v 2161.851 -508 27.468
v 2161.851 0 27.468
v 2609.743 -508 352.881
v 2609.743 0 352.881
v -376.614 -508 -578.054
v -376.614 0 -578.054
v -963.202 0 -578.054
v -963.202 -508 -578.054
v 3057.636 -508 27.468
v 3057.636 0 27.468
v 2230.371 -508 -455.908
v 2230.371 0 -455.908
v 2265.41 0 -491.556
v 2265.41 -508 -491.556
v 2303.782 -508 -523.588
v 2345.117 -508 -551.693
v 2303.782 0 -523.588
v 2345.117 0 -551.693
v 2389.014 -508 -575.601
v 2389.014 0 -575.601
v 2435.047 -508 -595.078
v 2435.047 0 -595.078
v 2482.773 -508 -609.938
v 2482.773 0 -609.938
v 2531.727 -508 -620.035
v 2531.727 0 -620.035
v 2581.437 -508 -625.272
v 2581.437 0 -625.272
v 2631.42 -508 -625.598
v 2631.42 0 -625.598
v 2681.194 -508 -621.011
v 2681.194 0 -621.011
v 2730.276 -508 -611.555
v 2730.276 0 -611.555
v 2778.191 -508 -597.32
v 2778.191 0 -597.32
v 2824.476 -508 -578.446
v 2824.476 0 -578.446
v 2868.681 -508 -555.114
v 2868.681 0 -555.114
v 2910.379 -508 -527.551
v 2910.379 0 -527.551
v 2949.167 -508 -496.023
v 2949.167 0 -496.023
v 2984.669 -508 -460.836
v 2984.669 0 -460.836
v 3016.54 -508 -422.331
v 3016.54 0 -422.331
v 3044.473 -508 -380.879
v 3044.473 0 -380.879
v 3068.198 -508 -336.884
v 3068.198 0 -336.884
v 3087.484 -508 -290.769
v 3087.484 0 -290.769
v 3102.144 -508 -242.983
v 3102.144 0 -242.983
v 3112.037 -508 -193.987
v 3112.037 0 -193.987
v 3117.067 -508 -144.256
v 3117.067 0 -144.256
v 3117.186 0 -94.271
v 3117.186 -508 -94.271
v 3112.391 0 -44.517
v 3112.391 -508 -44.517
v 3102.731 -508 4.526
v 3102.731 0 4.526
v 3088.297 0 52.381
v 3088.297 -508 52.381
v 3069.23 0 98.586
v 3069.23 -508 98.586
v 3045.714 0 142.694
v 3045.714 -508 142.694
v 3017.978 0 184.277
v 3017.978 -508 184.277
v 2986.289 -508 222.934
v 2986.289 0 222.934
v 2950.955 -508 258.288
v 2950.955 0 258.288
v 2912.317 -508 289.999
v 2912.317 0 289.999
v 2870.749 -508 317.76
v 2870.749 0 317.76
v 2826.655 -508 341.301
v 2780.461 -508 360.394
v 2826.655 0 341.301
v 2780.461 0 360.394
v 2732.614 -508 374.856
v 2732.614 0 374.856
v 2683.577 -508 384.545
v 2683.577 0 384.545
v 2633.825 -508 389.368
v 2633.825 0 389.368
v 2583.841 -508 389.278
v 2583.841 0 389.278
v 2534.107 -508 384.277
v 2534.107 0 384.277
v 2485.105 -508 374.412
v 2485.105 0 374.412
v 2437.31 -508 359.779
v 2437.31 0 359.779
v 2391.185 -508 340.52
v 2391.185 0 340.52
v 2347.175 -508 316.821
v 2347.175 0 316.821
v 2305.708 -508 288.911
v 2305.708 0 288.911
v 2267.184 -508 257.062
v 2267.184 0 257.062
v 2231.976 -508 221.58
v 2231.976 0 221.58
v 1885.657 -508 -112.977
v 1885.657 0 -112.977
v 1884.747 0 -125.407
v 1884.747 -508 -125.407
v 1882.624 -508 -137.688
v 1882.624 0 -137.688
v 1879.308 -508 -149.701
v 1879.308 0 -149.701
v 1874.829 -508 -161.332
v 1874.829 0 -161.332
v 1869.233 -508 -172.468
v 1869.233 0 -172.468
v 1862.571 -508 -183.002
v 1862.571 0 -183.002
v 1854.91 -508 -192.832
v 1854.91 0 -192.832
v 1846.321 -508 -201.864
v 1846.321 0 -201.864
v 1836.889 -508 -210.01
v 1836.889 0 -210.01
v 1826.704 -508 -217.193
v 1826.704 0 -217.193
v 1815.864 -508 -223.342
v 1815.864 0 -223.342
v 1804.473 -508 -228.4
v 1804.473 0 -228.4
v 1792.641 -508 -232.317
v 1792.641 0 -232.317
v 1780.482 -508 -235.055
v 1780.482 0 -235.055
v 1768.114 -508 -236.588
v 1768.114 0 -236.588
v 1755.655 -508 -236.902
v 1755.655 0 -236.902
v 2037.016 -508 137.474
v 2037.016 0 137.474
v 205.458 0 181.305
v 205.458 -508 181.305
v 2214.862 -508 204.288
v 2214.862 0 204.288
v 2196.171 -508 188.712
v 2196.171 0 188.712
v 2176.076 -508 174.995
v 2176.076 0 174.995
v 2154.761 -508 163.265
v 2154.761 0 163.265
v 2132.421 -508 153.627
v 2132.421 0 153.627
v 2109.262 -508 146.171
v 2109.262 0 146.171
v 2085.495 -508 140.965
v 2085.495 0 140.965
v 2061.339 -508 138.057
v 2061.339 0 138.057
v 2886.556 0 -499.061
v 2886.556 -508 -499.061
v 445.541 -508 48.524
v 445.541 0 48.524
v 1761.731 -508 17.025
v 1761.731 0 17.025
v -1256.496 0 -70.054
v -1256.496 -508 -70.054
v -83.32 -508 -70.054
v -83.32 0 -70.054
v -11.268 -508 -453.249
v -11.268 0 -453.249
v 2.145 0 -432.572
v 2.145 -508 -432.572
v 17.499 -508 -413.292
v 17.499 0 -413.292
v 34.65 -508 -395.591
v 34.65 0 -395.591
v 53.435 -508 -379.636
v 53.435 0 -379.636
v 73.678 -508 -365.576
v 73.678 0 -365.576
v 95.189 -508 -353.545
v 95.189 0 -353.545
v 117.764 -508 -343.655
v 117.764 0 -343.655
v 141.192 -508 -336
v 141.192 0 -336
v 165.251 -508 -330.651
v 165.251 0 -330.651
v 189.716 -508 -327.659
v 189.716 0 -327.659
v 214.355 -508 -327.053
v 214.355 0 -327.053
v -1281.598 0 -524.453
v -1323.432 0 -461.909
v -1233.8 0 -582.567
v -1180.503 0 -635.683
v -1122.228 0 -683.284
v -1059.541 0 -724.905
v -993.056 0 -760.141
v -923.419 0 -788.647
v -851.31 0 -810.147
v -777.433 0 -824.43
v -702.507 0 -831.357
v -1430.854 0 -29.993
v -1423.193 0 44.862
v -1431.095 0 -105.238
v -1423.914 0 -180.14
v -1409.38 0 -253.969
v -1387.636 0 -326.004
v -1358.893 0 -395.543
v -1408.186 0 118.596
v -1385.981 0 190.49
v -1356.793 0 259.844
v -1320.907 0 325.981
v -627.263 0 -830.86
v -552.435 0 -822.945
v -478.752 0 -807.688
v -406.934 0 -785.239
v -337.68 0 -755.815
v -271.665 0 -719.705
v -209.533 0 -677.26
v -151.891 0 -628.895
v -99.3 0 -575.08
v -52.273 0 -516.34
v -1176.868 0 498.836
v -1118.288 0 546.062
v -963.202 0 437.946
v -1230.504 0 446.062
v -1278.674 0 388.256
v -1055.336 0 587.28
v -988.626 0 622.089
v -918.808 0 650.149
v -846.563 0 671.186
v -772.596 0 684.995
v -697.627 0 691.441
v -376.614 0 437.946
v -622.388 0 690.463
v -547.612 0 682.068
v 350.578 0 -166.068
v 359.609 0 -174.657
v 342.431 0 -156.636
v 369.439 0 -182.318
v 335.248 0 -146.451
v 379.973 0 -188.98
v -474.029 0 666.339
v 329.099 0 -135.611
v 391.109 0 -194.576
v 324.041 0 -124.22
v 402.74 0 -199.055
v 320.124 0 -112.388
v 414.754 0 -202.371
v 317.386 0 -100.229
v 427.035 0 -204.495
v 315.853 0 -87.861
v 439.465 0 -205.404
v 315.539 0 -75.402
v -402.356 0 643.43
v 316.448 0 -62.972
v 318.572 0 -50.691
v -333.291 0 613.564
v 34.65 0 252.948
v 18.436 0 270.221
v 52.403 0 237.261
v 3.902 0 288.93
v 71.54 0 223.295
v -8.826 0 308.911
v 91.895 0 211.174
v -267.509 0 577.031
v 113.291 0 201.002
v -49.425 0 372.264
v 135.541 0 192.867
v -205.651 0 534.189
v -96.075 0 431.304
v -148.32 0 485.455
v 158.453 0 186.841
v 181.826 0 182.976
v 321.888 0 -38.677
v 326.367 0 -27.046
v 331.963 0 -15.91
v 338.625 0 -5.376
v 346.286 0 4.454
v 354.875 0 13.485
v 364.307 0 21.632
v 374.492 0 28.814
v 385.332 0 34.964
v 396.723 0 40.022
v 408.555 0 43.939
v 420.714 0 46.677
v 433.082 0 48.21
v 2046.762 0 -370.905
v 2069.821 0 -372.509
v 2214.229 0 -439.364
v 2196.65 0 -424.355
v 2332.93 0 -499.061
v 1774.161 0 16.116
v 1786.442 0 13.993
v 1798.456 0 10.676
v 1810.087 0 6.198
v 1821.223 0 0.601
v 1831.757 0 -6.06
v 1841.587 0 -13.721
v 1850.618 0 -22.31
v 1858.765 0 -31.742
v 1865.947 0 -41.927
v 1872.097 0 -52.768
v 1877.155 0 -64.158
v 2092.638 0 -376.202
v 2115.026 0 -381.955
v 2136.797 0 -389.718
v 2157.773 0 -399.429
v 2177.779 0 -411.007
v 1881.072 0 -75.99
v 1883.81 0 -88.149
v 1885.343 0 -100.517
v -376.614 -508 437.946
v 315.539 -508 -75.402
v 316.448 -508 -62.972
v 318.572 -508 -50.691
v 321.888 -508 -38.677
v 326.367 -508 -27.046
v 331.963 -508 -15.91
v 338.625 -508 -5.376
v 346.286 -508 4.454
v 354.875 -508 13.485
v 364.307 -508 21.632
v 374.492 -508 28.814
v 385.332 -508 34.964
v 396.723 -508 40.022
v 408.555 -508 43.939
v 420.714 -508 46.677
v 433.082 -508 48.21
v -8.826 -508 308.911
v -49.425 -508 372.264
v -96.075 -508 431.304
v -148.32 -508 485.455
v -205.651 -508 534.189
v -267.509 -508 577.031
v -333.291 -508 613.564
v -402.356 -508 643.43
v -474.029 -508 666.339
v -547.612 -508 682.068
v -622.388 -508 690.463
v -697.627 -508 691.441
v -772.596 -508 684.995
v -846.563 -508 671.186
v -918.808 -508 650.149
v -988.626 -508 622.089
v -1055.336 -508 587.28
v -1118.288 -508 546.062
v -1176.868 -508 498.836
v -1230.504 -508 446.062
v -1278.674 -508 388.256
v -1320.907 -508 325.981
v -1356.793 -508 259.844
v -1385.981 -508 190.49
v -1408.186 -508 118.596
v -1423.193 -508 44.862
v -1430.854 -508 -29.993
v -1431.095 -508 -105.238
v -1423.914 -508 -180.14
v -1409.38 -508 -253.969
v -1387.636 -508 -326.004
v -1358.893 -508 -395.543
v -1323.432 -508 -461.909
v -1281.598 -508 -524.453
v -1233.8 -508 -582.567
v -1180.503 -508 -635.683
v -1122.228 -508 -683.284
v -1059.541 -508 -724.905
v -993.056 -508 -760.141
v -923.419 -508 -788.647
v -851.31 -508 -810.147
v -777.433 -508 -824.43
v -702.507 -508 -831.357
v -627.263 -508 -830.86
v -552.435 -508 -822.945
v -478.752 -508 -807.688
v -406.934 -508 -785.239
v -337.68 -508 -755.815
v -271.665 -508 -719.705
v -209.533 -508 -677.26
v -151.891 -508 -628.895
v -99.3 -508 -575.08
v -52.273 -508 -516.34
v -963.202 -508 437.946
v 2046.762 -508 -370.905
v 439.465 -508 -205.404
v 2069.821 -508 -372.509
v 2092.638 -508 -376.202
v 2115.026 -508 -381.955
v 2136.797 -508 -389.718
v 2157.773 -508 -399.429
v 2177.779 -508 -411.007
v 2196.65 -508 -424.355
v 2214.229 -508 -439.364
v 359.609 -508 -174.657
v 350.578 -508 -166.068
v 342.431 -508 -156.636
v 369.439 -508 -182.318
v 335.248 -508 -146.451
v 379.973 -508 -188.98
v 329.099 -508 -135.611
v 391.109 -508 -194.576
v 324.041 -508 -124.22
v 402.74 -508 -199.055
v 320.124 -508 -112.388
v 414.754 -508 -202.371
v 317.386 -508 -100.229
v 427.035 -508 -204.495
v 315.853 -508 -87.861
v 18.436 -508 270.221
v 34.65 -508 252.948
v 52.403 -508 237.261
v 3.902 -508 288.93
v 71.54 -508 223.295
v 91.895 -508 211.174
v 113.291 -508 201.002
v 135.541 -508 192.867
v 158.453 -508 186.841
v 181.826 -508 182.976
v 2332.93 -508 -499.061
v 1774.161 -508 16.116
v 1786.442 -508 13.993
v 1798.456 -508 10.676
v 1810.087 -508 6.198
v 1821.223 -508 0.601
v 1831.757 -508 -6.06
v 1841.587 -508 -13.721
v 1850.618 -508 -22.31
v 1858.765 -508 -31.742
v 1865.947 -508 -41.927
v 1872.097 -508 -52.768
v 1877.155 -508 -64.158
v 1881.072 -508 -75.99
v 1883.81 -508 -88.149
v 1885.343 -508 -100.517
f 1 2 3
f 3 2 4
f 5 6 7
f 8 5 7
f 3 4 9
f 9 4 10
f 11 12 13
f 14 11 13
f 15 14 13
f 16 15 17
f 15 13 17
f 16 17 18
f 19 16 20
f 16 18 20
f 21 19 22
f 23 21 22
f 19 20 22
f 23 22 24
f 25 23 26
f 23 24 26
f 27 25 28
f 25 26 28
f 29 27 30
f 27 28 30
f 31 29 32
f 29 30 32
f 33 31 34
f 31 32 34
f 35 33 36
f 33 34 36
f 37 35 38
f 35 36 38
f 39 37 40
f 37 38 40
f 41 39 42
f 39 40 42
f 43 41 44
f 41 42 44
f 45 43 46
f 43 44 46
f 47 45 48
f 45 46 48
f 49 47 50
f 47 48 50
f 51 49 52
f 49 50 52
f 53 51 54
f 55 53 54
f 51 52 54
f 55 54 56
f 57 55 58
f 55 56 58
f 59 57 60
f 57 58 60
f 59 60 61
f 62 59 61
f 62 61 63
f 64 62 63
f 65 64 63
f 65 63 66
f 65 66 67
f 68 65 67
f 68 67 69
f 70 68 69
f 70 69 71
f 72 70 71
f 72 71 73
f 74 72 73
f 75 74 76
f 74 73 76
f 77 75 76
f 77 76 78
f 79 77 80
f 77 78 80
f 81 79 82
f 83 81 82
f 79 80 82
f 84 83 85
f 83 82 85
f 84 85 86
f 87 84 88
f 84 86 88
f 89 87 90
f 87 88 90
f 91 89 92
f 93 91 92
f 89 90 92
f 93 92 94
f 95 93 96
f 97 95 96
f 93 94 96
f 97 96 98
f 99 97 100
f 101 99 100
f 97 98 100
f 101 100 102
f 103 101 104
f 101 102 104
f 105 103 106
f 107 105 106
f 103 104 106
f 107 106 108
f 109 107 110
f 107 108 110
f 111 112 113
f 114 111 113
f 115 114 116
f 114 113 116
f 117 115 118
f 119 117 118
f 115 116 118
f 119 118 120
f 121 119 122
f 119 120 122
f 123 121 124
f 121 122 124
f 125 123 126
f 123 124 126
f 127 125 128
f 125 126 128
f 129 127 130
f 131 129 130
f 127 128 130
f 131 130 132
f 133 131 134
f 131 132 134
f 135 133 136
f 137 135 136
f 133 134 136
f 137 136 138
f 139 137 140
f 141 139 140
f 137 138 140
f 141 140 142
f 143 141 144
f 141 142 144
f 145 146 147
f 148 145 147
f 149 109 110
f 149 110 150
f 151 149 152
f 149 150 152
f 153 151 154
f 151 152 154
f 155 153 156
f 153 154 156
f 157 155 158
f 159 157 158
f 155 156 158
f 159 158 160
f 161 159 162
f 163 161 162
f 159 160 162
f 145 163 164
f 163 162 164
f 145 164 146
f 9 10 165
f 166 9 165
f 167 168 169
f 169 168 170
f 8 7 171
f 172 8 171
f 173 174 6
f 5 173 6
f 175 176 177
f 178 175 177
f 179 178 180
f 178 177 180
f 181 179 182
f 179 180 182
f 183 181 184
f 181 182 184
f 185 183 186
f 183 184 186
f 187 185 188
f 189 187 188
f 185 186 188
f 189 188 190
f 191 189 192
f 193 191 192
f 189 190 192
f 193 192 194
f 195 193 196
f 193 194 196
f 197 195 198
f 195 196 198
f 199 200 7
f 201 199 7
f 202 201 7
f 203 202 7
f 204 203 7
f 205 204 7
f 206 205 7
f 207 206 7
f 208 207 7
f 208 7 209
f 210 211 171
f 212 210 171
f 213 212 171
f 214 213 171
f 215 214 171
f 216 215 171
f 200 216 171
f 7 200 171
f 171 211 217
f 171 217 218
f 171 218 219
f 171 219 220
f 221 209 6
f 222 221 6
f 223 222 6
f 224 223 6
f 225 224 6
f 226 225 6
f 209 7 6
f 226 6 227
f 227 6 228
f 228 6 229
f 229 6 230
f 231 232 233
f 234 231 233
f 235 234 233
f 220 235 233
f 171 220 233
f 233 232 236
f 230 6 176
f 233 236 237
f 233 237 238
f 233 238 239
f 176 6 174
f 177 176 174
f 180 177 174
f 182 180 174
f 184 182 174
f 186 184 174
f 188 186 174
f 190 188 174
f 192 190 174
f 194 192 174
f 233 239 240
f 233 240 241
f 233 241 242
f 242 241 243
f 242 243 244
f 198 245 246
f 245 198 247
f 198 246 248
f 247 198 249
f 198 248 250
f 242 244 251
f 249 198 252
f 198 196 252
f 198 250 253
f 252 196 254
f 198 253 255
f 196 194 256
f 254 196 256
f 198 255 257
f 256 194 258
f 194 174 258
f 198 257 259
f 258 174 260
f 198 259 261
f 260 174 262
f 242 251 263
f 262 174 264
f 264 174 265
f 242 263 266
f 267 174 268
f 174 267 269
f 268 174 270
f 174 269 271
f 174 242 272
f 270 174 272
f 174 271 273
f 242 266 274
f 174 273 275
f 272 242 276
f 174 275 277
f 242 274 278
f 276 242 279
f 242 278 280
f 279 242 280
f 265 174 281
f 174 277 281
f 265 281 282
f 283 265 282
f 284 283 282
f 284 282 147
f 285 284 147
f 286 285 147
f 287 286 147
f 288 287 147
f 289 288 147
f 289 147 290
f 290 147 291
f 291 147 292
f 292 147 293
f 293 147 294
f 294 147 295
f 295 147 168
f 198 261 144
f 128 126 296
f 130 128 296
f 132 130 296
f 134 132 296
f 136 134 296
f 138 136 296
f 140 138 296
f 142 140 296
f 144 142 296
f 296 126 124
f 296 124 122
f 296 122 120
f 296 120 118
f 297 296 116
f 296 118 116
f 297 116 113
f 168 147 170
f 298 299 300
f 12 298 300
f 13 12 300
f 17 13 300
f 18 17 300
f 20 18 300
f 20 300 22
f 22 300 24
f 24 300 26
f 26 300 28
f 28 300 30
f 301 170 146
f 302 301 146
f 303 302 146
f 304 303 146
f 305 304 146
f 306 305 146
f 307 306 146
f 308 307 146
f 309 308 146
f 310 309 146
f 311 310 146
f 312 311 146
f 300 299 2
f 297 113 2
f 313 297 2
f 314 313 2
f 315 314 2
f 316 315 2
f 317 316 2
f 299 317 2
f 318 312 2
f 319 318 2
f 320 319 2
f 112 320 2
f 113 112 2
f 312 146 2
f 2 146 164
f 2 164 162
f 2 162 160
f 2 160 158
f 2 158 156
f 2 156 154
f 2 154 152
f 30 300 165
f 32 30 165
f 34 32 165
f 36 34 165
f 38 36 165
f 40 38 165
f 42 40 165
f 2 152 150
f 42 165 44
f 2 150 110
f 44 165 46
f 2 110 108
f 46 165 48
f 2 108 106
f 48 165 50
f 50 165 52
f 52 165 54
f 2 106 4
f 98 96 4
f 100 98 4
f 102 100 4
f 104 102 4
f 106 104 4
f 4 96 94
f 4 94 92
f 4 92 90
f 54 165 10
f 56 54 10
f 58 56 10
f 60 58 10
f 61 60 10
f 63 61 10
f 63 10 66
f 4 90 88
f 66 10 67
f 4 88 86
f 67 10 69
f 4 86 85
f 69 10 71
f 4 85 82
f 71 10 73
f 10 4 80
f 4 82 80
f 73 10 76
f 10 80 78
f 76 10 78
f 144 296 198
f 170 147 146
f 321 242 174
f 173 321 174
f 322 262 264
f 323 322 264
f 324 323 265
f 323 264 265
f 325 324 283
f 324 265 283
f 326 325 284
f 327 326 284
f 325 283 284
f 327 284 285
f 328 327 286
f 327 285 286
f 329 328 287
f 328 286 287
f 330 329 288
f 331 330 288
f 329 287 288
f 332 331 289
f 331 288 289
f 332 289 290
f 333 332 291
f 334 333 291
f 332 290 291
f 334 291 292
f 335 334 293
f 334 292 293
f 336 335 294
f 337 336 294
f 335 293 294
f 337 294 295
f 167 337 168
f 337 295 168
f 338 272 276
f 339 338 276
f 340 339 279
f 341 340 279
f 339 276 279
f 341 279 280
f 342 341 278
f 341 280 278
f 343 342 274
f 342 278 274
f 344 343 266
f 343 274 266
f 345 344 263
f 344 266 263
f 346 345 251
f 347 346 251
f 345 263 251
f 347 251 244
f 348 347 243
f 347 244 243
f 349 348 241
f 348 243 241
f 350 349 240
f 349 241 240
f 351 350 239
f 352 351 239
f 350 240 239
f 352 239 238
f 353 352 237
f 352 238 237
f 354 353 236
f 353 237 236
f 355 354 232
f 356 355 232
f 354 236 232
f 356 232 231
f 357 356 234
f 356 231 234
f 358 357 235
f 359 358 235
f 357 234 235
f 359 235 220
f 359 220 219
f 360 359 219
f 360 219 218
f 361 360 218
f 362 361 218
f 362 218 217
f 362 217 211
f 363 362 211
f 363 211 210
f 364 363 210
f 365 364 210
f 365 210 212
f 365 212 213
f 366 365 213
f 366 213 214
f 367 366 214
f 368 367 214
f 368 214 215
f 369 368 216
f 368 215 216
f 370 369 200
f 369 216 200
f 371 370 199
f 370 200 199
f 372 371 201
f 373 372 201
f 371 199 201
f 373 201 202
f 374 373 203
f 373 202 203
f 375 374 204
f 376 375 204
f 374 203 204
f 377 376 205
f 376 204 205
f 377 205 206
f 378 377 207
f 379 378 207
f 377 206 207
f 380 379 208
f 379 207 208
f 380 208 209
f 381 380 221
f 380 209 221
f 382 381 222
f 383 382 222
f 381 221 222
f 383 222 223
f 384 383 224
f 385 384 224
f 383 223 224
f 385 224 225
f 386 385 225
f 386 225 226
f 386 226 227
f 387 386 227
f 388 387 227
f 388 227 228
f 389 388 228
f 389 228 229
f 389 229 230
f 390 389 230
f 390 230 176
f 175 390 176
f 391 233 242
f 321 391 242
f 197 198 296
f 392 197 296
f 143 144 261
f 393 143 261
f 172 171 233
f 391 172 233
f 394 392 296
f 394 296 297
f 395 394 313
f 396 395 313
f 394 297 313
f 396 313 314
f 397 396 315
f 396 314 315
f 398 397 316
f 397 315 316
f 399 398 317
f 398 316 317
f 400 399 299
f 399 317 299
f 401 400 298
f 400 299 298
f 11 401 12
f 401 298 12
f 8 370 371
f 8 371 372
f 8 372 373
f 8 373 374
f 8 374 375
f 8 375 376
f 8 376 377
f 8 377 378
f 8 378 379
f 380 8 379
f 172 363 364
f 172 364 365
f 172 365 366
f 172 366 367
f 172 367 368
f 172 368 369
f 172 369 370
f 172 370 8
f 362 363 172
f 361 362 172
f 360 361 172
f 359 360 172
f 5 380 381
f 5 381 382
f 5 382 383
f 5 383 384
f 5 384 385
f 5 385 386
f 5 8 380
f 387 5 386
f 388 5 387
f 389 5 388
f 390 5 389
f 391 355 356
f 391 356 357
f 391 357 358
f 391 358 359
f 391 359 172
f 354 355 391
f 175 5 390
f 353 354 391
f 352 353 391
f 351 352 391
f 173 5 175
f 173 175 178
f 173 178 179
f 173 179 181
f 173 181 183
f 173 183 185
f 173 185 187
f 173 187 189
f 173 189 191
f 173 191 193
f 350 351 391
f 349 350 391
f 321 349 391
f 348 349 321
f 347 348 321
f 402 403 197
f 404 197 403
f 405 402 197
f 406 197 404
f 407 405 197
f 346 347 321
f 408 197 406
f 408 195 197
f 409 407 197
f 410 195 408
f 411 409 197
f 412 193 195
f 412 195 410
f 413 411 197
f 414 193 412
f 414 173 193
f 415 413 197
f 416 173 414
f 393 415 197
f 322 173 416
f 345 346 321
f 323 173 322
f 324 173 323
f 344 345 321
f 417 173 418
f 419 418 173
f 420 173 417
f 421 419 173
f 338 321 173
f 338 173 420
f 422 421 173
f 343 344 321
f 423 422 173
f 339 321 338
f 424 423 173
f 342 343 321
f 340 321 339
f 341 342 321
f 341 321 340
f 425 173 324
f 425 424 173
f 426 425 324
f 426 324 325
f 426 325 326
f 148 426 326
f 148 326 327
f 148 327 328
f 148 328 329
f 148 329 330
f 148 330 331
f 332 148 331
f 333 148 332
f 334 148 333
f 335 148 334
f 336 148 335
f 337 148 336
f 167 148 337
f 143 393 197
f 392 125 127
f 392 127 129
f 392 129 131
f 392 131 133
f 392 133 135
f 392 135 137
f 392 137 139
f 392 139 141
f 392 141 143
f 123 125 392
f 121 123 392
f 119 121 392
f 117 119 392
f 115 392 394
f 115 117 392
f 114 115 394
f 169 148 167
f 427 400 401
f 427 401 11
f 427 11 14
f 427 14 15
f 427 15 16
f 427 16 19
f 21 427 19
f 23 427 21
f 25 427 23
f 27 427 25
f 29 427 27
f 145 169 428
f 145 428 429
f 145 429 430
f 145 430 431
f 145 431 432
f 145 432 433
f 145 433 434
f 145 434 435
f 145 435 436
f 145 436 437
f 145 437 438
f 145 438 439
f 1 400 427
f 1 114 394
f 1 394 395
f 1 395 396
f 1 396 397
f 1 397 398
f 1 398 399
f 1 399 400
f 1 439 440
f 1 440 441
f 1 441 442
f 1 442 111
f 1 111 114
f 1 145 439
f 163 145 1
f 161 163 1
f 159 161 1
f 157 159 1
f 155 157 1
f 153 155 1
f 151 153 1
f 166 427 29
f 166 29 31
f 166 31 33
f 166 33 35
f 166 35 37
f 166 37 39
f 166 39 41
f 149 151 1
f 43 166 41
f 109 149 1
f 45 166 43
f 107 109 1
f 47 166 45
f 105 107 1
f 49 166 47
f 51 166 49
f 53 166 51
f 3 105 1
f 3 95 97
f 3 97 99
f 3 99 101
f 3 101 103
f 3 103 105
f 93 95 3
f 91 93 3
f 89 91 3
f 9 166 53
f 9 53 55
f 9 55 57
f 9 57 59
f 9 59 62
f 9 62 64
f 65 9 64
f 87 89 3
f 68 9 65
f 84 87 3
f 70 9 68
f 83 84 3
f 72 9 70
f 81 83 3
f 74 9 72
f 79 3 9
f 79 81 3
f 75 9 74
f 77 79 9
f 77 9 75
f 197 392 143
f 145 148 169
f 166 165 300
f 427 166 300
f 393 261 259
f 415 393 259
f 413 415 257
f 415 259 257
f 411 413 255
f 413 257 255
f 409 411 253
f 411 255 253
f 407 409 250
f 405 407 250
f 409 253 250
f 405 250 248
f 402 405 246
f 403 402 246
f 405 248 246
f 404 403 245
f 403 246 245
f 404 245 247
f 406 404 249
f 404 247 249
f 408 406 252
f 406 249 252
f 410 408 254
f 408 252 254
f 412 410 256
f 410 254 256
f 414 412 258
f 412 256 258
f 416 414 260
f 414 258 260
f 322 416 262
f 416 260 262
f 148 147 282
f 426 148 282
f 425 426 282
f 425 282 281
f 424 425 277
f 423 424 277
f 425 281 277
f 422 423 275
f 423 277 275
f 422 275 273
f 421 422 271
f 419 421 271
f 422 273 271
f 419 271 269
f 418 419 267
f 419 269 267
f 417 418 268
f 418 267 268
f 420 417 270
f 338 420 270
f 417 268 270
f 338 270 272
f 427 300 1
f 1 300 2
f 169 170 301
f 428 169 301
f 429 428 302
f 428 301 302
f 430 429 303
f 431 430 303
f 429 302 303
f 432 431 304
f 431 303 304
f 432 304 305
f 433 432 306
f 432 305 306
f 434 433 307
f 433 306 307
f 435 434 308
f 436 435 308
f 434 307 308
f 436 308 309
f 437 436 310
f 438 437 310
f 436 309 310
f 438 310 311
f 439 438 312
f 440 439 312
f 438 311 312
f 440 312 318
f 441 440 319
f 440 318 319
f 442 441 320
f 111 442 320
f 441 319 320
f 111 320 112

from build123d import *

# Parameters (mm, degrees)
F1_DEPTH = 508


# Not quite as in the source:
# - a feature names something its author has since deleted; it is built from what else it names


with BuildPart() as f1:
    # F0 (on Front) → F1 (new body)
    with BuildSketch(Plane.XZ):
        with BuildLine():
            ThreePointArc((90.8717905063, -26.9446916266), (60.5867734993, 146.7906129627), (-8.8258541664, 308.9110170961))
            ThreePointArc((-8.8258541664, 308.9110170961), (-1431.9038743199, -67.6123663617), (-11.2682681042, -453.2487029361))
            ThreePointArc((-11.2682681042, -453.2487029361), (65.7984429314, -268.4990677015), (92.0922130555, -70.0542559229))
            ThreePointArc((92.0922130555, -70.0542559229), (91.7870463114, -48.4908380293), (90.8717905063, -26.9446916266))
        make_face()
        Polygon((-83.3199134478, -70.0542559229), (-376.6138501962, -578.0542559229), (-963.2017236928, -578.0542559229), (-1256.4956604412, -70.0542559229), (-963.2017236928, 437.9457440771), (-376.6138501962, 437.9457440771), align=None, mode=Mode.SUBTRACT)
        with BuildLine():
            ThreePointArc((2230.3710697662, -455.9083929118), (2790.4957209899, -592.8162662797), (3117.7431527799, -118.0610566342))
            ThreePointArc((3117.7431527799, -118.0610566342), (2791.6202241037, 356.2644971015), (2231.9764955882, 221.5804495369))
            ThreePointArc((2231.9764955882, 221.5804495369), (2101.7445790707, -116.8572670267), (2230.3710697662, -455.9083929118))
        make_face()
        Polygon((2609.7431527799, 352.8808427932), (3057.6355150268, 27.4679936521), (2886.5558559499, -499.0610566342), (2332.9304496099, -499.0610566342), (2161.850790533, 27.4679936521), align=None, mode=Mode.SUBTRACT)
        with BuildLine():
            ThreePointArc((2230.3710697662, -455.9083929118), (2101.7445790707, -116.8572670267), (2231.9764955882, 221.5804495369))
            ThreePointArc((2231.9764955882, 221.5804495369), (2143.7064538419, 158.1782052373), (2037.0163567757, 137.4739051975))
            Line((2037.0163567757, 137.4739051975), (205.4579798763, 181.3054773441))
            ThreePointArc((205.4579798763, 181.3054773441), (81.5760518671, 216.9972910394), (-8.8258541664, 308.9110170961))
            ThreePointArc((-8.8258541664, 308.9110170961), (60.5867734993, 146.7906129627), (90.8717905063, -26.9446916266))
            ThreePointArc((90.8717905063, -26.9446916266), (91.7870463114, -48.4908380293), (92.0922130555, -70.0542559229))
            ThreePointArc((92.0922130555, -70.0542559229), (65.7984429314, -268.4990677015), (-11.2682681042, -453.2487029361))
            ThreePointArc((-11.2682681042, -453.2487029361), (84.287618689, -359.2994998742), (214.3550483926, -327.0528878488))
            Line((214.3550483925, -327.0528878488), (2046.761838476, -370.9047636255))
            ThreePointArc((2046.761838476, -370.9047636255), (2147.3957483239, -394.3351582008), (2230.3710697662, -455.9083929118))
        make_face()
        with BuildLine():
            ThreePointArc((439.4645539871, -205.4036891617), (350.5776252706, -166.0684205619), (315.5393103829, -75.4016353409))
            ThreePointArc((315.5393103829, -75.4016353409), (354.8745789827, 13.4852933757), (445.5413642038, 48.5236082633))
            Line((445.5413642038, 48.5236082633), (1761.7314269061, 17.0254696183))
            ThreePointArc((1761.7314269061, 17.0254696183), (1850.6183556226, -22.3097989815), (1885.6566705103, -112.9765842025))
            ThreePointArc((1885.6566705103, -112.9765842025), (1846.3214019105, -201.8635129191), (1755.6546166894, -236.9018278067))
            Line((1755.6546166894, -236.9018278067), (439.4645539871, -205.4036891617))
        make_face(mode=Mode.SUBTRACT)
    extrude(amount=F1_DEPTH)


solid = f1.part
